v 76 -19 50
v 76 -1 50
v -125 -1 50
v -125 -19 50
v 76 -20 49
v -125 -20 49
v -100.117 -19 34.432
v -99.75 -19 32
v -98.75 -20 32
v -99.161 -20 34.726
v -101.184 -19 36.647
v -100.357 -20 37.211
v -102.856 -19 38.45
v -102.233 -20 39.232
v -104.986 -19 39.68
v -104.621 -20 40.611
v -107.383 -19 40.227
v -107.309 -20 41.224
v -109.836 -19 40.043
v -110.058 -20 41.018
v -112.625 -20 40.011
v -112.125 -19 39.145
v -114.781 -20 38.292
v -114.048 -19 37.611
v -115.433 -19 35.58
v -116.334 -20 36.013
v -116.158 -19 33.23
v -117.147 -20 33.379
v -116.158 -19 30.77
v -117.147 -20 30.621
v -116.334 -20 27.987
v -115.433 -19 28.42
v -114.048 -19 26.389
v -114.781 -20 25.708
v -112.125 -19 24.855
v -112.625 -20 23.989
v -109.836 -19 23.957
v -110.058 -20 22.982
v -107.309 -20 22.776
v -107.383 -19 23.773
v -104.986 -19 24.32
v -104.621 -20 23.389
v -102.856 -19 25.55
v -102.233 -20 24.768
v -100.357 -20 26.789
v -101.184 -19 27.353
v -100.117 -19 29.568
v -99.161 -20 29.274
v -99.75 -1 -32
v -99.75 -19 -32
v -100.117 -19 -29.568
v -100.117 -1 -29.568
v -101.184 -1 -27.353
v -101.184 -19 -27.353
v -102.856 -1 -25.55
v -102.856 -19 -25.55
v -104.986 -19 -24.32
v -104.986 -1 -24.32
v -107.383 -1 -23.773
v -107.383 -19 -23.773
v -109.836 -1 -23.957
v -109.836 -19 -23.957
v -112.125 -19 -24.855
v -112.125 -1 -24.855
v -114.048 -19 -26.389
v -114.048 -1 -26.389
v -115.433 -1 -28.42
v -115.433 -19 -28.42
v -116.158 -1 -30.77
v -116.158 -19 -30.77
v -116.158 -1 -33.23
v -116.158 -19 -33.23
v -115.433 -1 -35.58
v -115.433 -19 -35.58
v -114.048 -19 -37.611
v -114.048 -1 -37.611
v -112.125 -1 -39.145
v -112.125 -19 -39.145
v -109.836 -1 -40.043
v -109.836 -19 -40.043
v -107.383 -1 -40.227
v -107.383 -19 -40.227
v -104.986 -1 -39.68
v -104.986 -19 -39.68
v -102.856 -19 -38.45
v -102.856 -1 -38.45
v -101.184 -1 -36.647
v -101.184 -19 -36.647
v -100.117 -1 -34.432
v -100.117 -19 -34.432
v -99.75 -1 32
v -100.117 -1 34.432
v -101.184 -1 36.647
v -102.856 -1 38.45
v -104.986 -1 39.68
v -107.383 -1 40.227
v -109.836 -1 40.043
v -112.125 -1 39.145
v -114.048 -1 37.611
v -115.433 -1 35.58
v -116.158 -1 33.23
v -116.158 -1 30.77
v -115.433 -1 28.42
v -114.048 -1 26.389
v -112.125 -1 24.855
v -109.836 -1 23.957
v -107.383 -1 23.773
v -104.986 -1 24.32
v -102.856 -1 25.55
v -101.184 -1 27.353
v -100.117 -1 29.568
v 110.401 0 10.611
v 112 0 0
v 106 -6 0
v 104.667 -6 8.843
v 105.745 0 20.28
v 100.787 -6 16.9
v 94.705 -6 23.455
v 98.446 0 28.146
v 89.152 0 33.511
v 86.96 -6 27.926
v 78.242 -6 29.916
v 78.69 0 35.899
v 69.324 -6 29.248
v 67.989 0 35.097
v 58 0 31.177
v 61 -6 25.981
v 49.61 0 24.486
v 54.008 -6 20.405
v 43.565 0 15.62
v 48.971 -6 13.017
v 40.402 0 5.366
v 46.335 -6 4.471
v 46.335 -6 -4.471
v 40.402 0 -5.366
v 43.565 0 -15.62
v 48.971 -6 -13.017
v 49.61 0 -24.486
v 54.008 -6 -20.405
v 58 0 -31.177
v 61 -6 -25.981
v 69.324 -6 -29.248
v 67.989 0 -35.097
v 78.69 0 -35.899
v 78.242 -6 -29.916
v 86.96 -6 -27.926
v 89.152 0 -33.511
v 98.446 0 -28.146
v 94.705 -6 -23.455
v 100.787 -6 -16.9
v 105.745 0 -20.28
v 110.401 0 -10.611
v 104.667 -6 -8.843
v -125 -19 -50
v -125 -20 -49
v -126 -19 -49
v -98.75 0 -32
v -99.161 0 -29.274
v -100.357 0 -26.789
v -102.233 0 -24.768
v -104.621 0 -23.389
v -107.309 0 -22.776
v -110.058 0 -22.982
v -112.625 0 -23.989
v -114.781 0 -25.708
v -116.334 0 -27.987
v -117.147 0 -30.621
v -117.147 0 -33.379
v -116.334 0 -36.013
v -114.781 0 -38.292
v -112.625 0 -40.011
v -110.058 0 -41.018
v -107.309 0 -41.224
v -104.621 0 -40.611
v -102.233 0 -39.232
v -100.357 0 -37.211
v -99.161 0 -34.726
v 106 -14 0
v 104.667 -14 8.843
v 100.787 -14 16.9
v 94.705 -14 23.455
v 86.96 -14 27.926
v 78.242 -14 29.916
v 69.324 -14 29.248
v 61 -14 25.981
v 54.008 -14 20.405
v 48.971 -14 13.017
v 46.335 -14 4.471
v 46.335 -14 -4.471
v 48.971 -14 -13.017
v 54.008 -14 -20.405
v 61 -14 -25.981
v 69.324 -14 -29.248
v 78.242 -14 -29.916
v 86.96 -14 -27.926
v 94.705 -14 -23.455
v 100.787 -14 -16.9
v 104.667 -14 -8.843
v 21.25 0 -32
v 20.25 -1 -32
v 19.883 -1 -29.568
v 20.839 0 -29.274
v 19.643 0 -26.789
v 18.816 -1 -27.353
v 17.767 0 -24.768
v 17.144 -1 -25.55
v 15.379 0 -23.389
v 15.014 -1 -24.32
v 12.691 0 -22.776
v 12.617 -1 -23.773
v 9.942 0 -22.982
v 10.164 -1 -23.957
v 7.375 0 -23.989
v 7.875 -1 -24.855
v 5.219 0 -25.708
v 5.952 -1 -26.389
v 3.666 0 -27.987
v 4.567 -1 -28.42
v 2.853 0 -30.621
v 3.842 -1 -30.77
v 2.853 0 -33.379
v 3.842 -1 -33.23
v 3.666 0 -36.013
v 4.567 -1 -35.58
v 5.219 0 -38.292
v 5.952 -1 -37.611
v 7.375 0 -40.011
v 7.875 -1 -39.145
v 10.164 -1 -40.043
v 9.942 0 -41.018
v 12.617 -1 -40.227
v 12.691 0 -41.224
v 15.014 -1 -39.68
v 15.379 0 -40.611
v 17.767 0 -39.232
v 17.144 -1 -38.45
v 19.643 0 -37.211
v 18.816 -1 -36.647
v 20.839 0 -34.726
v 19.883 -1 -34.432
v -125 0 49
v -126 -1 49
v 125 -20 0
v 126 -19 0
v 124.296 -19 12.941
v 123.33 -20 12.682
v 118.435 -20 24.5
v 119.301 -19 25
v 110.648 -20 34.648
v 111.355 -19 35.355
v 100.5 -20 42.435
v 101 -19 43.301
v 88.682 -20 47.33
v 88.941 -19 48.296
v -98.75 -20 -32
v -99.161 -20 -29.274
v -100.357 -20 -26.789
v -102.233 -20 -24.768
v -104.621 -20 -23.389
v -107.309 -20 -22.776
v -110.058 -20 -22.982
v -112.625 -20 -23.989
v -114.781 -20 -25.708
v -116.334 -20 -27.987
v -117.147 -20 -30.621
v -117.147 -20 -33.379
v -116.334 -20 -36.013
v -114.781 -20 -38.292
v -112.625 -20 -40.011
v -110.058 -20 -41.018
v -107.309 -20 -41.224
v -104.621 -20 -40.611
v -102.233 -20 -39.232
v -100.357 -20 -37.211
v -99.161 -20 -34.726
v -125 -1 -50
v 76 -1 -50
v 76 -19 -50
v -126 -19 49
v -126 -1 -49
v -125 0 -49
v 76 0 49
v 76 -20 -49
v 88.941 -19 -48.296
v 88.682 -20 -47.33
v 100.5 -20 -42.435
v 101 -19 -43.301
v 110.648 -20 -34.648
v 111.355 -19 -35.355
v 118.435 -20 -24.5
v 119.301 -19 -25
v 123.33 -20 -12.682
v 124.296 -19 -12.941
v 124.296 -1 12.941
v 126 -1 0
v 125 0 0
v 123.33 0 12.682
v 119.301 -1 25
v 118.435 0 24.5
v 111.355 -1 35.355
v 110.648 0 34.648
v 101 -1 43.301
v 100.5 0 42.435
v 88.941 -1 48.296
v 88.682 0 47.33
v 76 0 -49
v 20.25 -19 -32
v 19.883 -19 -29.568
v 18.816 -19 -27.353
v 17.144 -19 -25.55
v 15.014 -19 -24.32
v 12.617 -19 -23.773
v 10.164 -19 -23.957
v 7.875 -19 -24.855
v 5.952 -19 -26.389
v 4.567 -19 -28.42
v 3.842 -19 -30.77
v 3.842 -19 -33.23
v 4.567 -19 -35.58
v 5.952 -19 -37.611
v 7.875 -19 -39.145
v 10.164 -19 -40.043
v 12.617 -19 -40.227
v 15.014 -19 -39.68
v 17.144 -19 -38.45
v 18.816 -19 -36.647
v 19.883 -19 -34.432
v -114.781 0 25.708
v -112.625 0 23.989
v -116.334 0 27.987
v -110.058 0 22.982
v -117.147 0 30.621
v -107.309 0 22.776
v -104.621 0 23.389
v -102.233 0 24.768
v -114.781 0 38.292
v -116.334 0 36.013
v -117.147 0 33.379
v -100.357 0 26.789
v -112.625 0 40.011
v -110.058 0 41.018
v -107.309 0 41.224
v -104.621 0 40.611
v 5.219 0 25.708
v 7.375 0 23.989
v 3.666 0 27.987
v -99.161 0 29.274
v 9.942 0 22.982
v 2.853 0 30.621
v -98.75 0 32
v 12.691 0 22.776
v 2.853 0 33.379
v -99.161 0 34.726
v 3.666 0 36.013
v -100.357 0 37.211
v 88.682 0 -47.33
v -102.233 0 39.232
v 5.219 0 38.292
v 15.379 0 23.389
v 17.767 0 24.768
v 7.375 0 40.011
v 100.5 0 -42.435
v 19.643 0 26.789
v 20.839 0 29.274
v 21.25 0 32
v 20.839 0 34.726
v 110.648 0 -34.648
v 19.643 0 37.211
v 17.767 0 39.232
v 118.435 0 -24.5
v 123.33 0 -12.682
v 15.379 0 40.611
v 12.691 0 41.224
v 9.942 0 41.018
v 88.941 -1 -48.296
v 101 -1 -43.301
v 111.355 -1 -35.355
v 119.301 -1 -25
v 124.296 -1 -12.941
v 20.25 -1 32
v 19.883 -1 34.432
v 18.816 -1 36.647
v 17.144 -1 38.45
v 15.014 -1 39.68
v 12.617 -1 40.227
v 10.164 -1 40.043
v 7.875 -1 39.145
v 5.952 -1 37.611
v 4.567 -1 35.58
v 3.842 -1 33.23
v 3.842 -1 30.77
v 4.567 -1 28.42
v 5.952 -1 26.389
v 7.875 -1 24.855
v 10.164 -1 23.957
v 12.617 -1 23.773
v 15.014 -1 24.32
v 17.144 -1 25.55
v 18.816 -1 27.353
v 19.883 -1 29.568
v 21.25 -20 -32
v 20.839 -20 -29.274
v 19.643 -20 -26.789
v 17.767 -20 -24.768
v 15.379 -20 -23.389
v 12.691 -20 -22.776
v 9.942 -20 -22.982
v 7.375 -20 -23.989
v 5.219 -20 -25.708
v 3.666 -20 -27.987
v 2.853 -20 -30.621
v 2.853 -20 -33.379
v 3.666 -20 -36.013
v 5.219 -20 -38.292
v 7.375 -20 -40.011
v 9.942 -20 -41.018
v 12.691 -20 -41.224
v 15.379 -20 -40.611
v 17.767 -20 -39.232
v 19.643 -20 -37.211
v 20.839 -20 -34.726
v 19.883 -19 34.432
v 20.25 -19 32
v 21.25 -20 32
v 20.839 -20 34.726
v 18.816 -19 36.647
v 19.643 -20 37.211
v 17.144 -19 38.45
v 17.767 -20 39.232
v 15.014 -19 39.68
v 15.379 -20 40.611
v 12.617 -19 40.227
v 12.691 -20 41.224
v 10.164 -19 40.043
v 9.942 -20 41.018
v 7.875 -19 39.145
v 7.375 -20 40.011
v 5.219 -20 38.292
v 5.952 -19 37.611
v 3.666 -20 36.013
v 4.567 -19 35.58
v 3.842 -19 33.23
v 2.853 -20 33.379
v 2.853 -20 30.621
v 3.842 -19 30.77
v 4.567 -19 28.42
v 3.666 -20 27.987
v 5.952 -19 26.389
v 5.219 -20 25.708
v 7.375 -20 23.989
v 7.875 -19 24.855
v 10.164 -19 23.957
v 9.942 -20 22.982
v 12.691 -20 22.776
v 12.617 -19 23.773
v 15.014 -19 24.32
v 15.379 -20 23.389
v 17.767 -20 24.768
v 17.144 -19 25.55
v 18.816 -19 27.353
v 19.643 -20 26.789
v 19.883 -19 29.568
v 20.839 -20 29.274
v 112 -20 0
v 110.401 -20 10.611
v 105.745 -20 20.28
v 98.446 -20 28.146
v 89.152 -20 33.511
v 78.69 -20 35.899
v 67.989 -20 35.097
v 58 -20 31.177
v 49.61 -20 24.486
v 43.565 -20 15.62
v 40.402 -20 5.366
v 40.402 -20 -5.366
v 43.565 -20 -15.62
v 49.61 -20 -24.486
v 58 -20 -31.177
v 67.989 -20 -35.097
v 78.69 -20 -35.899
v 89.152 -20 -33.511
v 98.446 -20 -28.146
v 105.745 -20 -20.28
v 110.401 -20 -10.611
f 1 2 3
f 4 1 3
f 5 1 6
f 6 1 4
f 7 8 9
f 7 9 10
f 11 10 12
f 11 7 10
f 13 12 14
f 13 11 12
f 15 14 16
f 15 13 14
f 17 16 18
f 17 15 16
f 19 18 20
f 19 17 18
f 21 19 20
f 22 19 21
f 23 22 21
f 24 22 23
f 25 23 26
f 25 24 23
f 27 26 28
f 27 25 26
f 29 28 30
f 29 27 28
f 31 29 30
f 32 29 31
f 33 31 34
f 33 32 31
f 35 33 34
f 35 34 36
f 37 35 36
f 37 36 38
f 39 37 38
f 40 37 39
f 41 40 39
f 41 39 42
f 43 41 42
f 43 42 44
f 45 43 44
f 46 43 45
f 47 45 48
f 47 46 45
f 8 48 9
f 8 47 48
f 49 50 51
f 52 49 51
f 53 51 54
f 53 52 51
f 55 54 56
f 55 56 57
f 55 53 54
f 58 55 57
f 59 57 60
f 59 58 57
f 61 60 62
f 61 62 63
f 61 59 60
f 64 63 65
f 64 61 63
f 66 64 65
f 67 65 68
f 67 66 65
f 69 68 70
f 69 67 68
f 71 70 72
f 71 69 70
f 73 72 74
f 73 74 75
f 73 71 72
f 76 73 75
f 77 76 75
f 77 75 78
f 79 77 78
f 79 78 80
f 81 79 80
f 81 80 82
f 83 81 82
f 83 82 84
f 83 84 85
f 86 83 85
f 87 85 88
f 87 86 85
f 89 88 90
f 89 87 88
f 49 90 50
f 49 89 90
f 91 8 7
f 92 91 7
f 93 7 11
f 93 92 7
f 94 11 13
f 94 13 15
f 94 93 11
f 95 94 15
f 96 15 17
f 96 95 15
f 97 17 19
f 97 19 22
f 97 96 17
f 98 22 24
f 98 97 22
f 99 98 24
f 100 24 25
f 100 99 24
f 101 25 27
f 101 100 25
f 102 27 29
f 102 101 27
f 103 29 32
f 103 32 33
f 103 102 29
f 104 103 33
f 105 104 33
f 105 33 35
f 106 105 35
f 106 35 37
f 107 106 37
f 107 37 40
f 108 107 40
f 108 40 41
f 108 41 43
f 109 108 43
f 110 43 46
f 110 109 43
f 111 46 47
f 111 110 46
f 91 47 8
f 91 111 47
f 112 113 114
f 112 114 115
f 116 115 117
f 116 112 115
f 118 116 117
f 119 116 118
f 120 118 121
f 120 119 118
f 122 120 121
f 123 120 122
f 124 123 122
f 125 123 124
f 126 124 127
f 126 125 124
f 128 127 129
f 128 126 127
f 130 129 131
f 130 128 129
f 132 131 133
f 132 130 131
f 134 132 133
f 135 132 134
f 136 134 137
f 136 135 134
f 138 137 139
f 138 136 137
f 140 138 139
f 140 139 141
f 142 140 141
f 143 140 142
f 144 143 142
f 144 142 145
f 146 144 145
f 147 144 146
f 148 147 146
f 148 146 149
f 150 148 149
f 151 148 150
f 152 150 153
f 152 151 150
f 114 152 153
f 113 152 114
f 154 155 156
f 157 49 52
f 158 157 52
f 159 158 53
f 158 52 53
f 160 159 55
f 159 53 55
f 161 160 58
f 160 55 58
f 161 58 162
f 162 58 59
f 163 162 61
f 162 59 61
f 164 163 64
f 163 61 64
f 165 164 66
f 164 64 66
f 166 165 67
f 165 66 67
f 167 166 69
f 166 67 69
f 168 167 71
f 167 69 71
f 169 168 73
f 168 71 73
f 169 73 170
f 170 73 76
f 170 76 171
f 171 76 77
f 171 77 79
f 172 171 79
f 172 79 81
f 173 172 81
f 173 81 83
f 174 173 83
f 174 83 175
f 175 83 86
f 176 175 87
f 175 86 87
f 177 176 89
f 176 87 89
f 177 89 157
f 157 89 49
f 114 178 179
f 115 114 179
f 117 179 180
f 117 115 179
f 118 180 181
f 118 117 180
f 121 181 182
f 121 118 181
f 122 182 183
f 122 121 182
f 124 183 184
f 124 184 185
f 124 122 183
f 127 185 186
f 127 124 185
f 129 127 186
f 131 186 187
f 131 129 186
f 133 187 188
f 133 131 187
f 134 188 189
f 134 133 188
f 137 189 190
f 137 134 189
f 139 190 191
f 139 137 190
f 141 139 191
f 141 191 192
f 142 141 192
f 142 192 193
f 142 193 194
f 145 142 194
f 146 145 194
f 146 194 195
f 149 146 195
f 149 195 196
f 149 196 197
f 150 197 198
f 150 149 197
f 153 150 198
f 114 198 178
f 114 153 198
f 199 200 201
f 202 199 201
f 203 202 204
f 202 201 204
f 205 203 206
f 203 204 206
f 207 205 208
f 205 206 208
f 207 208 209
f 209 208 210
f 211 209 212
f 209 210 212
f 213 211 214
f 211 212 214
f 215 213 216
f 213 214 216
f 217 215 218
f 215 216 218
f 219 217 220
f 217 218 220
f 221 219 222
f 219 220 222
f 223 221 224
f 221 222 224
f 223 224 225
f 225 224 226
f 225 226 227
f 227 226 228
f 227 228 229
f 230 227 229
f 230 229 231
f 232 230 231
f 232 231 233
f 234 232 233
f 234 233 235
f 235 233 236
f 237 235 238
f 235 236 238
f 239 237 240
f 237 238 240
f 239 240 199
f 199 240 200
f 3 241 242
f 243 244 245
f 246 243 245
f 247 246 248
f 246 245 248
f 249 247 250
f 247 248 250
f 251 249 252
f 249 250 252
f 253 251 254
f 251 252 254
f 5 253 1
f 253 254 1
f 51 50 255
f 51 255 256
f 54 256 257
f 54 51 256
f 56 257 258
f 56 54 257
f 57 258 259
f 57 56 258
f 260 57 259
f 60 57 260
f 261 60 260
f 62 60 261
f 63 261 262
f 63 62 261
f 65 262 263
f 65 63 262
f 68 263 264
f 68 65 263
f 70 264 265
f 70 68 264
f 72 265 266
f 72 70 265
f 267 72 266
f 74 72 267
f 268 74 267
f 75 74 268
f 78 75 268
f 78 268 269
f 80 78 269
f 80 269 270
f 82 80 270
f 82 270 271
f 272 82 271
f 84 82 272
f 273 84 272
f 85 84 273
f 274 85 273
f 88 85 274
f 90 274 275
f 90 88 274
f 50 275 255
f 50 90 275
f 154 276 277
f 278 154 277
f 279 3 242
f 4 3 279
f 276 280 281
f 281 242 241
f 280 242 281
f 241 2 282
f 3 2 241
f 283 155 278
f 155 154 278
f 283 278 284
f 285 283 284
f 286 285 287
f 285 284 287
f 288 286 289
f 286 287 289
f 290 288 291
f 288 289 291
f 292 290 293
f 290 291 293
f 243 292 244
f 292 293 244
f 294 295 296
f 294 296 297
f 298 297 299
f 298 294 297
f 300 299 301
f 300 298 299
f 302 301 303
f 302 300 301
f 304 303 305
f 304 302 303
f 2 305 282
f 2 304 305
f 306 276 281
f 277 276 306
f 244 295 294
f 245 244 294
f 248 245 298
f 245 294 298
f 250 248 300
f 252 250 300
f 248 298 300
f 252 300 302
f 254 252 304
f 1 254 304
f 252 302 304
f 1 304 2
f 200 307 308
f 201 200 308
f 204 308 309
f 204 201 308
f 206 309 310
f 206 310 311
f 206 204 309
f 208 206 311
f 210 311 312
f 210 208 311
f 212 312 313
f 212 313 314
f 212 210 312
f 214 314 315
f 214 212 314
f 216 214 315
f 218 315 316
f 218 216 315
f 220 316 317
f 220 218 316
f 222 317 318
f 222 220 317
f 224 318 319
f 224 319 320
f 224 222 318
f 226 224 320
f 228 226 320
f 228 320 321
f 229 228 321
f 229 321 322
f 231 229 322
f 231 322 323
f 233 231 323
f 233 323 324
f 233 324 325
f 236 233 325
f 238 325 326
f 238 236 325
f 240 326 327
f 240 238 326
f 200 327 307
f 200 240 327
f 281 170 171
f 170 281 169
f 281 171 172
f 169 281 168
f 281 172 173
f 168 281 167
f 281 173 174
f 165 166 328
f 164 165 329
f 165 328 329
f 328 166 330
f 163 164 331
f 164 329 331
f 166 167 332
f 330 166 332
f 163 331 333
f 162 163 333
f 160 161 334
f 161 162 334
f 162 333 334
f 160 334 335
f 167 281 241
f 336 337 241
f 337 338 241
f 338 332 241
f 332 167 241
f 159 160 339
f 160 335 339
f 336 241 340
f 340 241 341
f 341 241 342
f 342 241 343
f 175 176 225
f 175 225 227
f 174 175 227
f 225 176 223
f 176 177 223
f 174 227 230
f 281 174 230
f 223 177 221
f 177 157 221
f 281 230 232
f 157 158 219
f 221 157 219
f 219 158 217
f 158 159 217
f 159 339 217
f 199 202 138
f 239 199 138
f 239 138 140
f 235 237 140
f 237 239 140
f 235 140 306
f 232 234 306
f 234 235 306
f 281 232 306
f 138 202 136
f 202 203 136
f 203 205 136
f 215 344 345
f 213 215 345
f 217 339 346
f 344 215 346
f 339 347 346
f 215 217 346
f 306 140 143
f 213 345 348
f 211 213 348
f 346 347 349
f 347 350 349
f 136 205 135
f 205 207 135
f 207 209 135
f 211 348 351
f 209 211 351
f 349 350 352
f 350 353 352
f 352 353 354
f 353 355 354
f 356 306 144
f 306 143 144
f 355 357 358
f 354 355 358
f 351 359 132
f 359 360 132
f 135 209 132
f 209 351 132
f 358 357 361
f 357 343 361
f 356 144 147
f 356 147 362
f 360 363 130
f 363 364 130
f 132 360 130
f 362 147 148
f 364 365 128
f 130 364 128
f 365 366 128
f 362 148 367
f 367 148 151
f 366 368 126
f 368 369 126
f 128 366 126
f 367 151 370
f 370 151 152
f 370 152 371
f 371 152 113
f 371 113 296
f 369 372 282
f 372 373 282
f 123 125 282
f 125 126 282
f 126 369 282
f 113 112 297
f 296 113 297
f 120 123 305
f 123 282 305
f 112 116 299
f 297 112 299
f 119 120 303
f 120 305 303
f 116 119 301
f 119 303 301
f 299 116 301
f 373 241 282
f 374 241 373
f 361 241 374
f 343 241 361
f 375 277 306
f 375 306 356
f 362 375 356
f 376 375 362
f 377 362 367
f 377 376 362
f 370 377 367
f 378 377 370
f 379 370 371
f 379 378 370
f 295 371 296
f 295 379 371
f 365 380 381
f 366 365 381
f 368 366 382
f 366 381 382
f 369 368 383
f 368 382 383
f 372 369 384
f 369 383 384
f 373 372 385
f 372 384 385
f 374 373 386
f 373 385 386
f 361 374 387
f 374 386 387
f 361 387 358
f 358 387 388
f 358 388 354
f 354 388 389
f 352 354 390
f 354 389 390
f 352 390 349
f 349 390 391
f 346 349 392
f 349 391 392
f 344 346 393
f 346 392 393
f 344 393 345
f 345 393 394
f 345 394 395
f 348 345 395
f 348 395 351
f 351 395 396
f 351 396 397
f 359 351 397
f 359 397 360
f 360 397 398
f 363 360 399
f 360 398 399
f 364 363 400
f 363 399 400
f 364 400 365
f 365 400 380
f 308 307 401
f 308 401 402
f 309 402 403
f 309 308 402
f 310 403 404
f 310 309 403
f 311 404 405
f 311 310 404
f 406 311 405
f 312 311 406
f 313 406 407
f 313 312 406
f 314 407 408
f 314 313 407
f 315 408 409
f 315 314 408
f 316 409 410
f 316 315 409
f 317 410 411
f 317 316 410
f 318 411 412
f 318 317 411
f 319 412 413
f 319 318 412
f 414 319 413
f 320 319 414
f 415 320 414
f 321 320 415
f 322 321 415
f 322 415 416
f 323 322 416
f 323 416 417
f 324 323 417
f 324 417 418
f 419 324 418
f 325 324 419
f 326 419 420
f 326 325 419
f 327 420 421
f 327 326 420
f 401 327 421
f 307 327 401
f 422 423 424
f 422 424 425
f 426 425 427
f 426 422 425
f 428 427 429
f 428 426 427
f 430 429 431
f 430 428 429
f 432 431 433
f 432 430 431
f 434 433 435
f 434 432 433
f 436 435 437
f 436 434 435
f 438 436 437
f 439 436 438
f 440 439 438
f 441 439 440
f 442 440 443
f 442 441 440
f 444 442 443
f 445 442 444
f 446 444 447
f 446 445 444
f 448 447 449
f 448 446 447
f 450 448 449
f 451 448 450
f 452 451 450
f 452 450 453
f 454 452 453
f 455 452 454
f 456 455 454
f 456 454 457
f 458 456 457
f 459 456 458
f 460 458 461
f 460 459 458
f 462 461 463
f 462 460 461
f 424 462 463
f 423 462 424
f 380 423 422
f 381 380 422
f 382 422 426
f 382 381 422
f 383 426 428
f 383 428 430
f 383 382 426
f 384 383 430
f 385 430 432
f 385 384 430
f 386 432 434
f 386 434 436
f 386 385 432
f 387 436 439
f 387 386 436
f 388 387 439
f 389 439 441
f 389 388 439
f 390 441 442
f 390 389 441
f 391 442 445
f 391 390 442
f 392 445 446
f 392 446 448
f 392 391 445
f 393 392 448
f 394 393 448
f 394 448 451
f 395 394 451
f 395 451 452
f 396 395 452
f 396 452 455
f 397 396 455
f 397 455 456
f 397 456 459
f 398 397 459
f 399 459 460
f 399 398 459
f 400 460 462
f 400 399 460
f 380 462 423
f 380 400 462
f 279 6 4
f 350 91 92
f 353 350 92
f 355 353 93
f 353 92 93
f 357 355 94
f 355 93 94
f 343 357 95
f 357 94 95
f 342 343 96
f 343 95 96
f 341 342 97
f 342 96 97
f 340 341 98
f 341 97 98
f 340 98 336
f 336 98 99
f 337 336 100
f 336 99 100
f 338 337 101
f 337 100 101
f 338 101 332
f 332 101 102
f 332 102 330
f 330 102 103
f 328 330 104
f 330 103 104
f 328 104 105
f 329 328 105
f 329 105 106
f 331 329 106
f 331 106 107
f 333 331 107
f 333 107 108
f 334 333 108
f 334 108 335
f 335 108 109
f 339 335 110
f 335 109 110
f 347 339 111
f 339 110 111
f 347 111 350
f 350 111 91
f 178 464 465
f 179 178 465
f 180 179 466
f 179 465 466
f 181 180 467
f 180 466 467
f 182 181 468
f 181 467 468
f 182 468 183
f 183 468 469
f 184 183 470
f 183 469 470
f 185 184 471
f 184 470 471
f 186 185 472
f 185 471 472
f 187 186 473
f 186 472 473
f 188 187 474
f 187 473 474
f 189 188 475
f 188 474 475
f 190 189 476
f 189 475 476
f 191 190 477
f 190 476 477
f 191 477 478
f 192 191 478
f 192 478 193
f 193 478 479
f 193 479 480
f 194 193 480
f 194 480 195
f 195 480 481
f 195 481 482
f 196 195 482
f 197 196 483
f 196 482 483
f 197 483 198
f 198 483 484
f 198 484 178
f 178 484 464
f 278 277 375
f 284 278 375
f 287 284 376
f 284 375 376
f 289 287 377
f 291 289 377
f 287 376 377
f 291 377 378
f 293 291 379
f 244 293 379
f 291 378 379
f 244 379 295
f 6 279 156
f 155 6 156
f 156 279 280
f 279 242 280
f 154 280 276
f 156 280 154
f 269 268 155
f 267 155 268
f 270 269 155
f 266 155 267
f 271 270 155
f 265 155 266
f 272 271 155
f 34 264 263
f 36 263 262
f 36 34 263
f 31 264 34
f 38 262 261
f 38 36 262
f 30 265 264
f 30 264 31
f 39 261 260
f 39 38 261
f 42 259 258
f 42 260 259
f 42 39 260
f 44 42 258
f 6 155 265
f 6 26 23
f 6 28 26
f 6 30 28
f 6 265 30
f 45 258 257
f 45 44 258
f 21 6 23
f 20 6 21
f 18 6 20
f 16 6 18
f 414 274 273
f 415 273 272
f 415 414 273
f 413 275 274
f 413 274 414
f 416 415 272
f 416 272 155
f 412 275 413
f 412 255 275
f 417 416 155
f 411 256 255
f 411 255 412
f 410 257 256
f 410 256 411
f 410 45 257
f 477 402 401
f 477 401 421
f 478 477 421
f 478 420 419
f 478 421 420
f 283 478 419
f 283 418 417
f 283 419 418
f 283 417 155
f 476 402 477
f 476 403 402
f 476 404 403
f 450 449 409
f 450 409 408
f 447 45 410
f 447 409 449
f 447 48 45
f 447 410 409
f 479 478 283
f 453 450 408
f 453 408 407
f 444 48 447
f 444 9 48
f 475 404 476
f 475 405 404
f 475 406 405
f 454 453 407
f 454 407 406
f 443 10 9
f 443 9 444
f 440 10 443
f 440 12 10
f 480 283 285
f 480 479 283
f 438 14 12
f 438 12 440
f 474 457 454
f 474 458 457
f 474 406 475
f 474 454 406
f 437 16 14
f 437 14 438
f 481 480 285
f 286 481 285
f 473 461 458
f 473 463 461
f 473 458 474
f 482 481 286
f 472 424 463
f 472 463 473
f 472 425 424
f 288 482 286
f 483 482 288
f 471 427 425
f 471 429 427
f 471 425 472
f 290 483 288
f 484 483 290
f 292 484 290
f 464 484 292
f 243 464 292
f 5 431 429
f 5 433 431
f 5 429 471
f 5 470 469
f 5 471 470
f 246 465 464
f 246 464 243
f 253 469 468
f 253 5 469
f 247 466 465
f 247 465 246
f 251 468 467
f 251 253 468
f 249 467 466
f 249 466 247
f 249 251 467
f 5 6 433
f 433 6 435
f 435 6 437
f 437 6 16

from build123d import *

# Parameters (mm, degrees)
F0_R     = 8.25
F0_R_2   = 30
F1_DEPTH = 20
F2_SIZE  = 6
F3_SIZE  = 1


with BuildPart() as f1:
    # F0 (on Front) → F1 (new body)
    with BuildSketch(Plane.XZ):
        with BuildLine():
            Line((-126, -50), (76, -50))
            ThreePointArc((76, -50), (111.355339, -35.355339), (126, 0))
            ThreePointArc((126, 0), (111.355339, 35.355339), (76, 50))
            Line((76, 50), (-126, 50))
            Line((-126, 50), (-126, -50))
        make_face()
        with Locations((-108, -32)):
            Circle(F0_R, mode=Mode.SUBTRACT)
        with Locations((12, -32)):
            Circle(F0_R, mode=Mode.SUBTRACT)
        with Locations((-108, 32)):
            Circle(F0_R, mode=Mode.SUBTRACT)
        with Locations((76, 0)):
            Circle(F0_R_2, mode=Mode.SUBTRACT)
        with Locations((12, 32)):
            Circle(F0_R, mode=Mode.SUBTRACT)
    extrude(amount=F1_DEPTH)

    # F2
    f2_edges = [f1.edges().sort_by_distance(p)[0] for p in [
        (46, -20, 0),
        (46, 0, 0),
    ]]
    chamfer(f2_edges, length=F2_SIZE)

    # F3
    f3_edges = [f1.edges().sort_by_distance(p)[0] for p in [
        (-116.25, -20, -32),
        (-116.25, -20, 32),
        (3.75, -20, -32),
        (3.75, -20, 32),
        (-25, -20, -50),
        (-126, -20, 0),
        (-25, -20, 50),
        (126, -20, 0),
        (-126, -10, -50),
        (-126, 0, 0),
        (-25, 0, -50),
        (-25, 0, 50),
        (-126, -10, 50),
        (-116.25, 0, -32),
        (-116.25, 0, 32),
        (3.75, 0, -32),
        (3.75, 0, 32),
        (126, 0, 0),
    ]]
    chamfer(f3_edges, length=F3_SIZE)


solid = f1.part
